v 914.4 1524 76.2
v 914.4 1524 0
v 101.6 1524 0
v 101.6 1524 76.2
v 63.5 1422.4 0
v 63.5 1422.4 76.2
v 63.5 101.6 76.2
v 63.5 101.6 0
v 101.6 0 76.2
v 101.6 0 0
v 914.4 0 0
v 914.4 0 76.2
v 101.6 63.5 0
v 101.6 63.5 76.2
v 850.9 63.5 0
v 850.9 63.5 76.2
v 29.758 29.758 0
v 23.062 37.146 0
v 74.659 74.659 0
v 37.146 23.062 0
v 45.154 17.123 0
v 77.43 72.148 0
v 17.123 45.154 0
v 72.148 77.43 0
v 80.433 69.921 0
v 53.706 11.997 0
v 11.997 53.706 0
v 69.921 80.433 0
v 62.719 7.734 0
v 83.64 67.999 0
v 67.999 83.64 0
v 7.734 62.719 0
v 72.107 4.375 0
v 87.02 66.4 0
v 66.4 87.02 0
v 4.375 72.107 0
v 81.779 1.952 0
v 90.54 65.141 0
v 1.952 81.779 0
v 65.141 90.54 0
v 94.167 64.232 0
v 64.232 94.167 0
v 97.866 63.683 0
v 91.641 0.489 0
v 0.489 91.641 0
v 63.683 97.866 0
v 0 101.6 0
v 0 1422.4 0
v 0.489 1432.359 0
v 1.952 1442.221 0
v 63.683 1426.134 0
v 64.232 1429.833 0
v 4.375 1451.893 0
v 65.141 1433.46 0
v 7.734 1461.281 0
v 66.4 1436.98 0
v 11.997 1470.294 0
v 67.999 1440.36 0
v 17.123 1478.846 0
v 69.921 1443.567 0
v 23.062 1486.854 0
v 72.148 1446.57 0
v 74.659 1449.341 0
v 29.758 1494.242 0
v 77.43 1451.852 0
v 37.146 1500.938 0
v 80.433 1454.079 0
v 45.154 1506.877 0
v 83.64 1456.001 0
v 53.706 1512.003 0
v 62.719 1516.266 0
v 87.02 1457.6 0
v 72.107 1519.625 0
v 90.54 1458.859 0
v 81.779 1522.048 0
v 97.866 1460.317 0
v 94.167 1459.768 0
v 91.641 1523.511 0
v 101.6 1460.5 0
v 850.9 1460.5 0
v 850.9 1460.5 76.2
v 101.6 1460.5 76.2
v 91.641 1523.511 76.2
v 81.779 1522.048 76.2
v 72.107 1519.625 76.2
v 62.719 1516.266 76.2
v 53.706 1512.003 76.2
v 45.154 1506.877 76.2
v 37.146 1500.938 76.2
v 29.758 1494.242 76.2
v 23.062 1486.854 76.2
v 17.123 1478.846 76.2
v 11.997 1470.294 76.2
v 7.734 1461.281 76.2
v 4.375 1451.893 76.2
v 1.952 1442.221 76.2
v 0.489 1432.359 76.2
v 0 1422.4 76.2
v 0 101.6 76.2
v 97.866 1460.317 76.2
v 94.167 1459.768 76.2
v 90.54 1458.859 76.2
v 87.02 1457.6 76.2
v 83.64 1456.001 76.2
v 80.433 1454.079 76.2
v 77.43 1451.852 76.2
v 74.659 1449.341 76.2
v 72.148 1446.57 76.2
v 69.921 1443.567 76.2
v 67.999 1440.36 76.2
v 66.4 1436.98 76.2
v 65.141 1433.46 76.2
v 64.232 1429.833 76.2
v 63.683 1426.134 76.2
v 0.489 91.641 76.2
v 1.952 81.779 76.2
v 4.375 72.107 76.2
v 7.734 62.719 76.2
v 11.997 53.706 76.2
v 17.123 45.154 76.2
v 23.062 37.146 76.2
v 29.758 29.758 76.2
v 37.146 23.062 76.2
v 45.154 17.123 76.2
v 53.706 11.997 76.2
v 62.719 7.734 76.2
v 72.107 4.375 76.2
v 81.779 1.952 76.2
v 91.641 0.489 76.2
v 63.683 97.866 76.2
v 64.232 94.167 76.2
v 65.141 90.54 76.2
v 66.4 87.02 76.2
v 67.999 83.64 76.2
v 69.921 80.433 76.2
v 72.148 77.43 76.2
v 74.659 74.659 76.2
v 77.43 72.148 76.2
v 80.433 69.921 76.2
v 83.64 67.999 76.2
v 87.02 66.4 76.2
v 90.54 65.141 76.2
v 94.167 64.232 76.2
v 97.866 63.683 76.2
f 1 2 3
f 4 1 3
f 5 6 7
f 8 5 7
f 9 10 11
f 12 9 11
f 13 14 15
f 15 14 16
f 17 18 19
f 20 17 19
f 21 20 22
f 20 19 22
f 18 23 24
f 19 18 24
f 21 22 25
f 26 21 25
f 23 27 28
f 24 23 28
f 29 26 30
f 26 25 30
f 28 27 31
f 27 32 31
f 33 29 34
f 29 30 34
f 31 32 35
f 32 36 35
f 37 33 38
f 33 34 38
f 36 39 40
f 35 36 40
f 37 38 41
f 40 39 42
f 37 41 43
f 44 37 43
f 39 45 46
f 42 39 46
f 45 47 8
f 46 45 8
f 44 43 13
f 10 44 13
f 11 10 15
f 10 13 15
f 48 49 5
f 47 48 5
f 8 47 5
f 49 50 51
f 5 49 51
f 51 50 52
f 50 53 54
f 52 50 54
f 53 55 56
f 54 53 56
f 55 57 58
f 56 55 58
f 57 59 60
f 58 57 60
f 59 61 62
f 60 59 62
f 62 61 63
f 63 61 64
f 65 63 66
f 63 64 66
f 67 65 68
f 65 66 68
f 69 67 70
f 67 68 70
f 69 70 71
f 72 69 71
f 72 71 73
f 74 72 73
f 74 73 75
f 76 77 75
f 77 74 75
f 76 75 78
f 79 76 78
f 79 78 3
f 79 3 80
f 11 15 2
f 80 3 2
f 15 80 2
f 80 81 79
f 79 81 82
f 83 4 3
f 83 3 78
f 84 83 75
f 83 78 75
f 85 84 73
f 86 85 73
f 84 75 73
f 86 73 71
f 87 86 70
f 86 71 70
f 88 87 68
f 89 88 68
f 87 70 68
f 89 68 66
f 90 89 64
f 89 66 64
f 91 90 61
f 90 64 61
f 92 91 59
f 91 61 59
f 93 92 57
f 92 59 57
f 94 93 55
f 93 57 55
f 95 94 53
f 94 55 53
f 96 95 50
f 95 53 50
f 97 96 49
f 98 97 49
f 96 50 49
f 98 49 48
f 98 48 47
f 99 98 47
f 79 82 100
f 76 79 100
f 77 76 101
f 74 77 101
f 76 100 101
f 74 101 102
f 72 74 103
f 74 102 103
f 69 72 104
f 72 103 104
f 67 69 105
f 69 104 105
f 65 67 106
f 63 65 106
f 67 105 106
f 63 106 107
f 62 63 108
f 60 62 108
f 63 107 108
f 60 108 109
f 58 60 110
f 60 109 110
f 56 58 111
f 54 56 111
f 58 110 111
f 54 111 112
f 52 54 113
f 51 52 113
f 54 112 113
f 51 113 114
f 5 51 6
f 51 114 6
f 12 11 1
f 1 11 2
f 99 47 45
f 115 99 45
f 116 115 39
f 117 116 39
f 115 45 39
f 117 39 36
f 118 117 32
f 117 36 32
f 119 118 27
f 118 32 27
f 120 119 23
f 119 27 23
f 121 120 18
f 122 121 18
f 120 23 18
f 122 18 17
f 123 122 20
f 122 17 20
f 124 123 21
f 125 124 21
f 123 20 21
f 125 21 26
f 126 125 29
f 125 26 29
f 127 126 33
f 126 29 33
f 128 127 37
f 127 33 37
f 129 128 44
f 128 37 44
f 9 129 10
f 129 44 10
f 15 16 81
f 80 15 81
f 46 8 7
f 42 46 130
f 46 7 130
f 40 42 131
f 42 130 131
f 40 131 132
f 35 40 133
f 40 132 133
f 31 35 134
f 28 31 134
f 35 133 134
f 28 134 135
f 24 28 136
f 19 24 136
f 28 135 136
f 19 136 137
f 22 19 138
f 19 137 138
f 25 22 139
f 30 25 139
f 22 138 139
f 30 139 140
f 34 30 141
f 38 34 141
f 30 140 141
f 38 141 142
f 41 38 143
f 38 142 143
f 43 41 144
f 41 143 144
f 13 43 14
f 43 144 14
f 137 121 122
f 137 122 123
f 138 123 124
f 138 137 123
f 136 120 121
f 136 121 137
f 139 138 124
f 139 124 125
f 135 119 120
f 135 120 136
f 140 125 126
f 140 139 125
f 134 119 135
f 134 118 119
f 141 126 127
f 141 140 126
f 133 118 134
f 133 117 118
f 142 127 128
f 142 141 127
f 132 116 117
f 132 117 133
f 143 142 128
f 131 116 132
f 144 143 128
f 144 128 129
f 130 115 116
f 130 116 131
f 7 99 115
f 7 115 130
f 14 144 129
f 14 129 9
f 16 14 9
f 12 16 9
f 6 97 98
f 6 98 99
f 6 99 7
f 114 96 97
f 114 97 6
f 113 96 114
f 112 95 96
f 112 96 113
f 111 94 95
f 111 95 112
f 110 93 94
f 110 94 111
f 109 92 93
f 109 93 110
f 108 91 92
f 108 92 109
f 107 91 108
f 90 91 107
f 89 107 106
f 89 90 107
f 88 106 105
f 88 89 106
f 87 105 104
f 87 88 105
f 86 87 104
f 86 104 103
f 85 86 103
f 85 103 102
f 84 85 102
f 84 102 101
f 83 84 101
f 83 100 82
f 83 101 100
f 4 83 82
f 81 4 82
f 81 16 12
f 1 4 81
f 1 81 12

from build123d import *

# Parameters (mm, degrees)
BOSS_EXTRUDE1_DEPTH = 76.2
CUT_EXTRUDE2_DEPTH  = 1779.906911561


with BuildPart() as part:
    # Sketch1 → Boss-Extrude1 (new body)
    with BuildSketch(Plane.XY):
        with BuildLine():
            Line((101.6, 0), (914.4, 0))
            Line((914.4, 0), (914.4, 1524))
            Line((914.4, 1524), (101.6, 1524))
            ThreePointArc((101.6, 1524), (29.757951031, 1494.242048969), (0, 1422.4))
            Line((0, 1422.4), (0, 101.6))
            ThreePointArc((0, 101.6), (29.757951031, 29.757951031), (101.6, 0))
        make_face()
    extrude(amount=BOSS_EXTRUDE1_DEPTH)

    # Sketch2 → Cut-Extrude2 (cut, through all)
    with BuildSketch(Plane.XY.offset(76.2)):
        with BuildLine():
            Line((63.5, 1422.4), (63.5, 101.6))
            ThreePointArc((63.5, 101.6), (74.659231637, 74.659231637), (101.6, 63.5))
            Line((101.6, 63.5), (850.9, 63.5))
            Line((850.9, 63.5), (850.9, 1460.5))
            Line((850.9, 1460.5), (101.6, 1460.5))
            ThreePointArc((101.6, 1460.5), (74.659231637, 1449.340768363), (63.5, 1422.4))
        make_face()
    extrude(amount=-CUT_EXTRUDE2_DEPTH, mode=Mode.SUBTRACT)


solid = part.part
